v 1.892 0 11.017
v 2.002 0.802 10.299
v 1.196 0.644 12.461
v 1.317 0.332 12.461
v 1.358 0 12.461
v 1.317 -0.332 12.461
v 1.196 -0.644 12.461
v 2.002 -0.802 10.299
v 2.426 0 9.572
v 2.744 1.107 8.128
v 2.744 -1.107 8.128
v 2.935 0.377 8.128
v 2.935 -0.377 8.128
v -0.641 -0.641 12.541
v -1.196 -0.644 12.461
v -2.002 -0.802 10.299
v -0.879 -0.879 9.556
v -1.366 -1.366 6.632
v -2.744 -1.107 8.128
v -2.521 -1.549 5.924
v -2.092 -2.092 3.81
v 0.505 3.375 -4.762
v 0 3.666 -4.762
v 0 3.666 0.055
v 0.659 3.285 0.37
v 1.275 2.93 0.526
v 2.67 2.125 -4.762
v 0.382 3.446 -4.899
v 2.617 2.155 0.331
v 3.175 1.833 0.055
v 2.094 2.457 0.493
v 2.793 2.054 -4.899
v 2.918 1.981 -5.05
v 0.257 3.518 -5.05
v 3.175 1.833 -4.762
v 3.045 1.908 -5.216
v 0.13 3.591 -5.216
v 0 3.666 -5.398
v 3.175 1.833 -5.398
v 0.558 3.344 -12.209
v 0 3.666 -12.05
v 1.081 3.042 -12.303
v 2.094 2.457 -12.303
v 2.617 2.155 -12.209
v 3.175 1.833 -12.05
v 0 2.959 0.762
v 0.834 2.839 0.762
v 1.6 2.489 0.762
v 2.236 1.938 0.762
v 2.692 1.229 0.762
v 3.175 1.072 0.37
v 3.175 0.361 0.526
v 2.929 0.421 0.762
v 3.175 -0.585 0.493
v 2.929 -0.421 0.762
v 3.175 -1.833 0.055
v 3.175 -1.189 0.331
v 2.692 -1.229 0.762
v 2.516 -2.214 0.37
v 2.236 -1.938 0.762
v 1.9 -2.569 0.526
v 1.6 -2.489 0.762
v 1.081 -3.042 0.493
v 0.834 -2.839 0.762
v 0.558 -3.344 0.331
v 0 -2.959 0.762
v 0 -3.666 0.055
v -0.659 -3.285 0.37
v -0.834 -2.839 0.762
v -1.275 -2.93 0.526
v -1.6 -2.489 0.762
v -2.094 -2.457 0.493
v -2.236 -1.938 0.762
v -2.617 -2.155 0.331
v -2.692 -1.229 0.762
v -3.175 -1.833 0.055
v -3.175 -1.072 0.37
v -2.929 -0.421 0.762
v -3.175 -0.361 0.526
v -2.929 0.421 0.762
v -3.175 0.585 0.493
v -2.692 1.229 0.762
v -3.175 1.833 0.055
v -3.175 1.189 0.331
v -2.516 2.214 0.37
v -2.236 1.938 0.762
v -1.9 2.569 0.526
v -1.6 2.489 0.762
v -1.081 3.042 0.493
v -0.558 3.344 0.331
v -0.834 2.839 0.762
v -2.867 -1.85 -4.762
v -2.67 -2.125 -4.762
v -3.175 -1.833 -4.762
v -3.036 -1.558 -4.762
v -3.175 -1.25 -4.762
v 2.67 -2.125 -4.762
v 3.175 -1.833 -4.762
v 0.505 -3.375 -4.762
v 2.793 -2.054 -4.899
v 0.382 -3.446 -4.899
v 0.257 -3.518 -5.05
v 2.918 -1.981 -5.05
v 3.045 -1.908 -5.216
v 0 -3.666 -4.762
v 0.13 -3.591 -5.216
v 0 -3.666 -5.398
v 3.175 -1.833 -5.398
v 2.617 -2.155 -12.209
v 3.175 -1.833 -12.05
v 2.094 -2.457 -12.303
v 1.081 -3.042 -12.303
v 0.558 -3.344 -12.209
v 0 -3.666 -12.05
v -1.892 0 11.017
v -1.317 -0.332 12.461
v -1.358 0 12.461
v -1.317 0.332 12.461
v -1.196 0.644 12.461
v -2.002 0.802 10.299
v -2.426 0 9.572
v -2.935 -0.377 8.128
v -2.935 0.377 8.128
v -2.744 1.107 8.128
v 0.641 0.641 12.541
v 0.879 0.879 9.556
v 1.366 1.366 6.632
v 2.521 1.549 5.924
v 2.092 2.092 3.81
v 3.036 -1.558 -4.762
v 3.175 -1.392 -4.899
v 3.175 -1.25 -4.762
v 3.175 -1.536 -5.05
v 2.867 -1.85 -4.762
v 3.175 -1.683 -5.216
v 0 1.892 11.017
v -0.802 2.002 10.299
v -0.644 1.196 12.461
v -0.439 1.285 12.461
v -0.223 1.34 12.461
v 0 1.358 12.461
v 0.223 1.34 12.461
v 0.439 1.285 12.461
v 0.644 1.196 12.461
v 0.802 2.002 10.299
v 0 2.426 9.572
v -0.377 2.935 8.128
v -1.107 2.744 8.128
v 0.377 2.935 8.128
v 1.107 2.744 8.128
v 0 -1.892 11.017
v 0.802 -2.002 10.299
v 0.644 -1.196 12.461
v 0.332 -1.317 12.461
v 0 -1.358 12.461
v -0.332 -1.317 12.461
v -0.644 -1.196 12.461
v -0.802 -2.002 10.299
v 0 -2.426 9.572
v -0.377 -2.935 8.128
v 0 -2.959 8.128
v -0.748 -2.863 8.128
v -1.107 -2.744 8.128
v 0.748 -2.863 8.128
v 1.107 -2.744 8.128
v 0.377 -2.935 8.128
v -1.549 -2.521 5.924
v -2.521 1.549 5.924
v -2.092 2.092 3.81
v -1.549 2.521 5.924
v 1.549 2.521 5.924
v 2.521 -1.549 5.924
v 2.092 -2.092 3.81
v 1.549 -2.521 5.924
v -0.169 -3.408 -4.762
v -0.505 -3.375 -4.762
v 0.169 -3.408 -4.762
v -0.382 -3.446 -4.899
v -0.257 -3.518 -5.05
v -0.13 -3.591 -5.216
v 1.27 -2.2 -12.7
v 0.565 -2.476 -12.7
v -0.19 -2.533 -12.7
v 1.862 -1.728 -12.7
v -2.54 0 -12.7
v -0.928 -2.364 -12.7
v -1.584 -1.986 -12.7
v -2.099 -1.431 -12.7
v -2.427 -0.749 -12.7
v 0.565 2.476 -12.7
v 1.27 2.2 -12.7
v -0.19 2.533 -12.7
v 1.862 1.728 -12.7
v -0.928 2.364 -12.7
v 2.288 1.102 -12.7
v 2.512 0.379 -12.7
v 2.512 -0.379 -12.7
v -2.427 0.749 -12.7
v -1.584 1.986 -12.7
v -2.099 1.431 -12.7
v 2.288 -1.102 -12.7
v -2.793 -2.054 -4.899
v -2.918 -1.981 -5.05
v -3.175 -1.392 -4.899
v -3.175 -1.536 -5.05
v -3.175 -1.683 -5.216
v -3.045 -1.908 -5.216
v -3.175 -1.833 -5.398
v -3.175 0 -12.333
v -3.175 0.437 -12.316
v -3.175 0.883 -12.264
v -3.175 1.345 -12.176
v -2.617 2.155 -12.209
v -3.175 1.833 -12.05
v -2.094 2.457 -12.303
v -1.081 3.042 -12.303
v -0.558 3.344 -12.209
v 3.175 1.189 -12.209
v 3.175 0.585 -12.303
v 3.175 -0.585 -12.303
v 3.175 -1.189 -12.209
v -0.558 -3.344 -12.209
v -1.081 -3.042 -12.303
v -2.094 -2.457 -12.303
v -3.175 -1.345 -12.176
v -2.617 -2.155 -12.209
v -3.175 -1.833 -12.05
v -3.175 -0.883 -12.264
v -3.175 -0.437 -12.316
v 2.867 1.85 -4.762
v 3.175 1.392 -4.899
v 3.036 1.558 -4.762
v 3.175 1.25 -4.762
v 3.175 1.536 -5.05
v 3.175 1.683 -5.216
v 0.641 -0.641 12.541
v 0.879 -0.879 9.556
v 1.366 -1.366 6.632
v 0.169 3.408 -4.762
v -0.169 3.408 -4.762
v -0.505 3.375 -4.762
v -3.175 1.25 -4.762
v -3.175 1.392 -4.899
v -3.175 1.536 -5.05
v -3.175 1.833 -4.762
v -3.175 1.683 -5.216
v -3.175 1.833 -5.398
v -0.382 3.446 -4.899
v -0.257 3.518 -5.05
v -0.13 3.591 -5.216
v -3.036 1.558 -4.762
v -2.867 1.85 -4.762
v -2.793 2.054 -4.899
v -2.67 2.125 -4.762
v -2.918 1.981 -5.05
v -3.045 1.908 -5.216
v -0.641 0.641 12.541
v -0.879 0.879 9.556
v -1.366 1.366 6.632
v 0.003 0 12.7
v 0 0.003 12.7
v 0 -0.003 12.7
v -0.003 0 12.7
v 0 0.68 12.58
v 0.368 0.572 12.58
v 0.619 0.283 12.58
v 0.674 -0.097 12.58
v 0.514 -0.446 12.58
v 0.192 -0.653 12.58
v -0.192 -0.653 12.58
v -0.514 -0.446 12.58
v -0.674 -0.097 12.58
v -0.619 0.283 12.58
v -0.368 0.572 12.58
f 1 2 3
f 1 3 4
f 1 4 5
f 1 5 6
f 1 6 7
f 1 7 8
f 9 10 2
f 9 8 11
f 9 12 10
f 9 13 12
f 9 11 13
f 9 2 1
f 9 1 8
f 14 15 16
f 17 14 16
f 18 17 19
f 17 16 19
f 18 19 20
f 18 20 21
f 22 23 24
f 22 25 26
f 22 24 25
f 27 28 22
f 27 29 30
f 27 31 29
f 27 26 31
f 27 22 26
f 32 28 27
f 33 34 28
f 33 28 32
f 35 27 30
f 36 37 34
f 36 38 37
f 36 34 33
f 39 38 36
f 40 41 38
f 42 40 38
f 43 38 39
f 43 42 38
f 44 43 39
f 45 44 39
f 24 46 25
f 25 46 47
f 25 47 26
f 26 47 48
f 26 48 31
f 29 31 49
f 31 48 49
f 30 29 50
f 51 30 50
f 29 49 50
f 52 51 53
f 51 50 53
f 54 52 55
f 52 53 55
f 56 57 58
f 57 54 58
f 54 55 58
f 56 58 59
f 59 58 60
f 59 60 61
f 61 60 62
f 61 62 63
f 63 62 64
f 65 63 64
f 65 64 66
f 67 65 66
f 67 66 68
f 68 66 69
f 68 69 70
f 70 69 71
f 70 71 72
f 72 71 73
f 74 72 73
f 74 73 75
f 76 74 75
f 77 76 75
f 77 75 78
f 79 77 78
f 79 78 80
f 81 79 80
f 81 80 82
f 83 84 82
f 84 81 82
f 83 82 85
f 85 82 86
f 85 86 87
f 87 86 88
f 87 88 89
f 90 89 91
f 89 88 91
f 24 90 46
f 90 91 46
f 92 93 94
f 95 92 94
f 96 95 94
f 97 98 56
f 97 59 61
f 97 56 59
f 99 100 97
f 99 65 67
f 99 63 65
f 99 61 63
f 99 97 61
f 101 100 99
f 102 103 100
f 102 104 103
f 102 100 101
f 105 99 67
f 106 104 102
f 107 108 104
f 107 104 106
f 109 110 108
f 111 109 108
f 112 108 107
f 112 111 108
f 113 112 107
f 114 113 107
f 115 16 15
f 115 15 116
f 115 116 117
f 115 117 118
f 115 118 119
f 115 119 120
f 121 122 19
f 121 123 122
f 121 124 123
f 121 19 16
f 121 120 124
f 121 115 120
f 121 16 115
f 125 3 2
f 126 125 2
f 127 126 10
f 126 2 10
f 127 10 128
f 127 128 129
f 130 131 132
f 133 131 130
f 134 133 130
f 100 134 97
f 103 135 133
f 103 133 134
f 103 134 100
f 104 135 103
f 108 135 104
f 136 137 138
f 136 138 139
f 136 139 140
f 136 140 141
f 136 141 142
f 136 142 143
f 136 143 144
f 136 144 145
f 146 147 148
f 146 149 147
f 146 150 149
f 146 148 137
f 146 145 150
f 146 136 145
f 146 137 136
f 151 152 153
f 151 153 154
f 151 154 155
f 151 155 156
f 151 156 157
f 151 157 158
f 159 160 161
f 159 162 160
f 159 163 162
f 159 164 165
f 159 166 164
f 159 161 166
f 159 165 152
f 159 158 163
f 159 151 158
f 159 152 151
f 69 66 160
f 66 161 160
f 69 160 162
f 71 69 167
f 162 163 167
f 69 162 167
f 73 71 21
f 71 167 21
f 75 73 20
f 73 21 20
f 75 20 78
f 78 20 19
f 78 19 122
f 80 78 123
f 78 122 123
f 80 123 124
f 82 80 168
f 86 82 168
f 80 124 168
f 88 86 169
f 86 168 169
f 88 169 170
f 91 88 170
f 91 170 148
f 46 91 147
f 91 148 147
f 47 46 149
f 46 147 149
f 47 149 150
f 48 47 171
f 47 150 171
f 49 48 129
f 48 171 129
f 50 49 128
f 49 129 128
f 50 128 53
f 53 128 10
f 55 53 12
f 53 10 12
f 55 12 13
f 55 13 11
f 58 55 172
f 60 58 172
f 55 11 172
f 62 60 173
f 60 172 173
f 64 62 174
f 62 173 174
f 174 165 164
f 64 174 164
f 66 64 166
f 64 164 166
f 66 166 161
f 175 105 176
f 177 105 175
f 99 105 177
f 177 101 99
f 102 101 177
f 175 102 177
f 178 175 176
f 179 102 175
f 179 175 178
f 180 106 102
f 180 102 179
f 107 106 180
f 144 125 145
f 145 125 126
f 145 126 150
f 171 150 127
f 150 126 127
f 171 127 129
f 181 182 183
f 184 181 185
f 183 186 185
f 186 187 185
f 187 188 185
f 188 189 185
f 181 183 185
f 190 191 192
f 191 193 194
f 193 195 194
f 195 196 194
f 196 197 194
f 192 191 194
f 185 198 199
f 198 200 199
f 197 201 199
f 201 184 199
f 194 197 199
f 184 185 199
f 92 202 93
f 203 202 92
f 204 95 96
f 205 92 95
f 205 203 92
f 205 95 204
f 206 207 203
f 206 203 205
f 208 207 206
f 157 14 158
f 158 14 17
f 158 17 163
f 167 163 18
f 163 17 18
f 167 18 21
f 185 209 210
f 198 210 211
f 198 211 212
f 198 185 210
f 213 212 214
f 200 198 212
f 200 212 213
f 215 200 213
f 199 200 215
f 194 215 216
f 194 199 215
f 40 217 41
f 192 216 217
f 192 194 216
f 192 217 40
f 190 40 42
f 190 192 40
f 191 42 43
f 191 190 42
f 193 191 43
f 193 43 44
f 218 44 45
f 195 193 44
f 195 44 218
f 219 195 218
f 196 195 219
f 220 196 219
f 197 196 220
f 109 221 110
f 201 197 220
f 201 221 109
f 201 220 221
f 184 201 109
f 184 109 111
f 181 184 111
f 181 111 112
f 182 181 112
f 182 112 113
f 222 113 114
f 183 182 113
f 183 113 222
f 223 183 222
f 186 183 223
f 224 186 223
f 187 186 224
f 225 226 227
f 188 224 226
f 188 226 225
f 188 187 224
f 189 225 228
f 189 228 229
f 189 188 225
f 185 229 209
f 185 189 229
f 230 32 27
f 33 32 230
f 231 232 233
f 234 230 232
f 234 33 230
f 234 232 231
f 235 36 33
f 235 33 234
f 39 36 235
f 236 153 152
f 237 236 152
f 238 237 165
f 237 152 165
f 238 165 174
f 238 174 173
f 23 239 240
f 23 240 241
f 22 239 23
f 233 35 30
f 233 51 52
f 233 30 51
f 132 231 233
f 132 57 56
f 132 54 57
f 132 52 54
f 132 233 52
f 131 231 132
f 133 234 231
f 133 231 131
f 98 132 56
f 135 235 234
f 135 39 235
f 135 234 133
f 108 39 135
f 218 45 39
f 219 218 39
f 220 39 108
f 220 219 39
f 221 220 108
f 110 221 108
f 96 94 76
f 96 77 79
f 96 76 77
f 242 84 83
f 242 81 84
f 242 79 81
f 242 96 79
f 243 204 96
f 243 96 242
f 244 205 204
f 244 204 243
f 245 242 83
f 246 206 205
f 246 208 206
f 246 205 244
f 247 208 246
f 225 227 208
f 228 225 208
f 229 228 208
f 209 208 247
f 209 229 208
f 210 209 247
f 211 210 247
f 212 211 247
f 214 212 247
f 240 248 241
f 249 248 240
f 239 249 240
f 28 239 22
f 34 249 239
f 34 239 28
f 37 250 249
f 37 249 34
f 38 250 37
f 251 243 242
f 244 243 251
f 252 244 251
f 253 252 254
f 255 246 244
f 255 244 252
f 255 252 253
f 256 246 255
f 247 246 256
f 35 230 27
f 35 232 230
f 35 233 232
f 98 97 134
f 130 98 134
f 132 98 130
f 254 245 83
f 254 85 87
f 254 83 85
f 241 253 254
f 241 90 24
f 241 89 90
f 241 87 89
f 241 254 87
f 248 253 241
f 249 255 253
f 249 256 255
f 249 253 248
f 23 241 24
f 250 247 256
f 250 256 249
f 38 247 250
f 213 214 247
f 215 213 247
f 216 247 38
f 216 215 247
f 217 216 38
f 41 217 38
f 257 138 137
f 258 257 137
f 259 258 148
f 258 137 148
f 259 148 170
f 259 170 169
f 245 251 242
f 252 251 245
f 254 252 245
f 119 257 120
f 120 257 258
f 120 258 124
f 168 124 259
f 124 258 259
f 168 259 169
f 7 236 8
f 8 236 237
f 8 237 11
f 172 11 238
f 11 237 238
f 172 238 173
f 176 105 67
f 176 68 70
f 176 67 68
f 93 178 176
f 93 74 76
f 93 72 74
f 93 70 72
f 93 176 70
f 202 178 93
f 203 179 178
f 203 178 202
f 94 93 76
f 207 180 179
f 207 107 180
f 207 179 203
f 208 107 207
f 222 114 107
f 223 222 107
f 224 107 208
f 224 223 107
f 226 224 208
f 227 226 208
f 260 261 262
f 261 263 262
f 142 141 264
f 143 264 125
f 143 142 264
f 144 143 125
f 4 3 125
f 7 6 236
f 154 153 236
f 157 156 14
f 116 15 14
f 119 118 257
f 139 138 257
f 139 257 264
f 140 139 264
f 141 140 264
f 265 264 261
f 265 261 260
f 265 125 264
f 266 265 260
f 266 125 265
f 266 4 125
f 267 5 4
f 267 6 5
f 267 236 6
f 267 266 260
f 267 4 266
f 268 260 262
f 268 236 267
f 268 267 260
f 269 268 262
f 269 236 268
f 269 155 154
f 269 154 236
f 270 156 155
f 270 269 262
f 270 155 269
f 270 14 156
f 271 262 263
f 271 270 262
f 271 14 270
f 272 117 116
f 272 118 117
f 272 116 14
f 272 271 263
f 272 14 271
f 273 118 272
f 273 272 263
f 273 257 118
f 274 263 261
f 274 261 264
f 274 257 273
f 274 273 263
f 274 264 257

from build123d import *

# Parameters (mm, degrees)
SKETCH4_OUTSIDE_W  = 15.138
SKETCH4_OUTSIDE_H  = 15.138
CUT_EXTRUDE1_DEPTH = 13.462
SKETCH6_OUTSIDE_W  = 22.586
SKETCH6_OUTSIDE_H  = 23.568
SKETCH6_OUTSIDE_R  = 2.54
CUT_EXTRUDE6_DEPTH = 2.54
CUT_EXTRUDE6_DRAFT = -60
CIRPATTERN3_COUNT  = 4


with BuildPart() as part:
    # Sketch3 → Revolve1 (revolve)
    with BuildSketch(Plane(origin=(0, 0, 0), x_dir=(0, 0, -1), z_dir=(1, 0, 0)), mode=Mode.PRIVATE) as revolve1_sk:
        Polygon((-12.7, 0), (12.7, 0), (12.7, 3.81), (-0.762, 3.81), (-0.762, 2.9591), (-12.7, 2.9591), align=None)
    revolve(revolve1_sk.sketch.rotate(Axis((0, 0, 12.7), (0, 0, -1)), 180), axis=Axis((0, 0, 12.7), (0, 0, -1)))

    # Sketch4 outside → Cut-Extrude1 (cut)
    with BuildSketch(Plane(origin=(0, 0, -12.7), x_dir=(-1, 0, 0), z_dir=(0, 0, -1))):
        Rectangle(SKETCH4_OUTSIDE_W, SKETCH4_OUTSIDE_H)
        Polygon((3.175, 1.833087105), (0, 3.666174209), (-3.175, 1.833087105), (-3.175, -1.833087105), (0, -3.666174209), (3.175, -1.833087105), align=None, mode=Mode.SUBTRACT)
    extrude(amount=-CUT_EXTRUDE1_DEPTH, mode=Mode.SUBTRACT)


with BuildPart() as cut_extrude6_tool:
    # Sketch6 outside → Cut-Extrude6 (with draft: the straight prism first)
    with BuildSketch(Plane(origin=(0, 0, -12.7), x_dir=(-1, 0, 0), z_dir=(0, 0, -1))):
        Rectangle(SKETCH6_OUTSIDE_W, SKETCH6_OUTSIDE_H)
        Circle(SKETCH6_OUTSIDE_R, mode=Mode.SUBTRACT)
    extrude(amount=-CUT_EXTRUDE6_DEPTH)
    # Cut-Extrude6: the draft: its side faces are tilted about the plane it starts from
    cut_extrude6_sides = [cut_extrude6_tool.faces().sort_by_distance(p)[0] for p in [
        (0, -11.784, -11.43),
        (-11.293, 0, -11.43),
        (0, 11.784, -11.43),
        (11.293, 0, -11.43),
        (2.54, 0, -11.43),
    ]]
    draft(cut_extrude6_sides, Plane(origin=(0, 0, -12.7), x_dir=(-1, 0, 0), z_dir=(0, 0, -1)), CUT_EXTRUDE6_DRAFT)


with BuildPart() as part_1:
    add(part.part)

    # Cut-Extrude6: cut by cut_extrude6_tool
    add(cut_extrude6_tool.part, mode=Mode.SUBTRACT)

    # Sketch12 → Cut-Revolve2 (revolve, cut)
    with BuildSketch(Plane(origin=(0, 0, 0), x_dir=(0, 0, -1), z_dir=(1, 0, 0))):
        Polygon((-0.762, 2.9591), (-0.762, 3.666174209), (-0.054925791, 3.666174209), align=None)
    revolve(axis=Axis((0, 0, 12.7), (0, 0, -1)), mode=Mode.SUBTRACT)

    # Cut-Sweep3: sweep along a path in Sketch10
    with BuildLine(Plane(origin=(0, 0, 0), x_dir=(0, 0, -1), z_dir=(0.7071067811865464, -0.7071067811865488, 0))) as cut_sweep3_path:
        ThreePointArc((-12.7, 0.898025612), (-8.161677229, 1.526035155), (-3.81, 2.9591))
    # Sketch7 → Cut-Sweep3 (sweep, cut)
    with BuildSketch(Plane.XY.offset(12.7)):
        with BuildLine():
            Line((0.635, 3.144163976), (0.635, 0.635))
            Line((0.635, 0.635), (3.144163976, 0.635))
            ThreePointArc((3.144163976, 0.635), (2.268148155, 2.268148155), (0.635, 3.144163976))
        make_face()
    cut_sweep3 = sweep(path=cut_sweep3_path.line, mode=Mode.SUBTRACT)

    # CirPattern3: Cut-Sweep3 ×4 about axis
    cirpattern3_axis = Axis((0, 0, 12.7), (0, 0, -1))
    for i in range(1, CIRPATTERN3_COUNT):
        add(cut_sweep3.rotate(cirpattern3_axis, i * 360 / CIRPATTERN3_COUNT), mode=Mode.SUBTRACT)

    # Sketch11 → Cut-Revolve1 (revolve, cut)
    with BuildSketch(Plane(origin=(0, 0, 0), x_dir=(1, 0, 0), z_dir=(0, 1, 0)), mode=Mode.PRIVATE) as cut_revolve1_sk:
        Polygon((1.27, -12.7), (2.9591, -8.128), (2.9591, -12.7), align=None)
    revolve(cut_revolve1_sk.sketch.rotate(Axis((0, 0, 12.7), (0, 0, -1)), 90), axis=Axis((0, 0, 12.7), (0, 0, -1)), mode=Mode.SUBTRACT)

    # Sketch13 → Cut-Revolve4 (revolve, cut)
    with BuildSketch(Plane(origin=(0, 0, 0), x_dir=(0, 0, -1), z_dir=(1, 0, 0))):
        Polygon((-12.7, 0.00254), (-12.46093948, 1.358319581), (-12.7, 1.358319581), align=None)
    revolve(axis=Axis((0, 0, 12.7), (0, 0, -1)), mode=Mode.SUBTRACT)

    # Sketch16 → Cut-Revolve5 (revolve, cut)
    with BuildSketch(Plane(origin=(0, 0, 0), x_dir=(0, 0, -1), z_dir=(1, 0, 0))):
        Polygon((4.7625, 3.666174209), (4.7625, 3.412174209), (5.3975, 3.666174209), align=None)
    revolve(axis=Axis((0, 0, 12.7), (0, 0, -1)), mode=Mode.SUBTRACT)


solid = part_1.part
